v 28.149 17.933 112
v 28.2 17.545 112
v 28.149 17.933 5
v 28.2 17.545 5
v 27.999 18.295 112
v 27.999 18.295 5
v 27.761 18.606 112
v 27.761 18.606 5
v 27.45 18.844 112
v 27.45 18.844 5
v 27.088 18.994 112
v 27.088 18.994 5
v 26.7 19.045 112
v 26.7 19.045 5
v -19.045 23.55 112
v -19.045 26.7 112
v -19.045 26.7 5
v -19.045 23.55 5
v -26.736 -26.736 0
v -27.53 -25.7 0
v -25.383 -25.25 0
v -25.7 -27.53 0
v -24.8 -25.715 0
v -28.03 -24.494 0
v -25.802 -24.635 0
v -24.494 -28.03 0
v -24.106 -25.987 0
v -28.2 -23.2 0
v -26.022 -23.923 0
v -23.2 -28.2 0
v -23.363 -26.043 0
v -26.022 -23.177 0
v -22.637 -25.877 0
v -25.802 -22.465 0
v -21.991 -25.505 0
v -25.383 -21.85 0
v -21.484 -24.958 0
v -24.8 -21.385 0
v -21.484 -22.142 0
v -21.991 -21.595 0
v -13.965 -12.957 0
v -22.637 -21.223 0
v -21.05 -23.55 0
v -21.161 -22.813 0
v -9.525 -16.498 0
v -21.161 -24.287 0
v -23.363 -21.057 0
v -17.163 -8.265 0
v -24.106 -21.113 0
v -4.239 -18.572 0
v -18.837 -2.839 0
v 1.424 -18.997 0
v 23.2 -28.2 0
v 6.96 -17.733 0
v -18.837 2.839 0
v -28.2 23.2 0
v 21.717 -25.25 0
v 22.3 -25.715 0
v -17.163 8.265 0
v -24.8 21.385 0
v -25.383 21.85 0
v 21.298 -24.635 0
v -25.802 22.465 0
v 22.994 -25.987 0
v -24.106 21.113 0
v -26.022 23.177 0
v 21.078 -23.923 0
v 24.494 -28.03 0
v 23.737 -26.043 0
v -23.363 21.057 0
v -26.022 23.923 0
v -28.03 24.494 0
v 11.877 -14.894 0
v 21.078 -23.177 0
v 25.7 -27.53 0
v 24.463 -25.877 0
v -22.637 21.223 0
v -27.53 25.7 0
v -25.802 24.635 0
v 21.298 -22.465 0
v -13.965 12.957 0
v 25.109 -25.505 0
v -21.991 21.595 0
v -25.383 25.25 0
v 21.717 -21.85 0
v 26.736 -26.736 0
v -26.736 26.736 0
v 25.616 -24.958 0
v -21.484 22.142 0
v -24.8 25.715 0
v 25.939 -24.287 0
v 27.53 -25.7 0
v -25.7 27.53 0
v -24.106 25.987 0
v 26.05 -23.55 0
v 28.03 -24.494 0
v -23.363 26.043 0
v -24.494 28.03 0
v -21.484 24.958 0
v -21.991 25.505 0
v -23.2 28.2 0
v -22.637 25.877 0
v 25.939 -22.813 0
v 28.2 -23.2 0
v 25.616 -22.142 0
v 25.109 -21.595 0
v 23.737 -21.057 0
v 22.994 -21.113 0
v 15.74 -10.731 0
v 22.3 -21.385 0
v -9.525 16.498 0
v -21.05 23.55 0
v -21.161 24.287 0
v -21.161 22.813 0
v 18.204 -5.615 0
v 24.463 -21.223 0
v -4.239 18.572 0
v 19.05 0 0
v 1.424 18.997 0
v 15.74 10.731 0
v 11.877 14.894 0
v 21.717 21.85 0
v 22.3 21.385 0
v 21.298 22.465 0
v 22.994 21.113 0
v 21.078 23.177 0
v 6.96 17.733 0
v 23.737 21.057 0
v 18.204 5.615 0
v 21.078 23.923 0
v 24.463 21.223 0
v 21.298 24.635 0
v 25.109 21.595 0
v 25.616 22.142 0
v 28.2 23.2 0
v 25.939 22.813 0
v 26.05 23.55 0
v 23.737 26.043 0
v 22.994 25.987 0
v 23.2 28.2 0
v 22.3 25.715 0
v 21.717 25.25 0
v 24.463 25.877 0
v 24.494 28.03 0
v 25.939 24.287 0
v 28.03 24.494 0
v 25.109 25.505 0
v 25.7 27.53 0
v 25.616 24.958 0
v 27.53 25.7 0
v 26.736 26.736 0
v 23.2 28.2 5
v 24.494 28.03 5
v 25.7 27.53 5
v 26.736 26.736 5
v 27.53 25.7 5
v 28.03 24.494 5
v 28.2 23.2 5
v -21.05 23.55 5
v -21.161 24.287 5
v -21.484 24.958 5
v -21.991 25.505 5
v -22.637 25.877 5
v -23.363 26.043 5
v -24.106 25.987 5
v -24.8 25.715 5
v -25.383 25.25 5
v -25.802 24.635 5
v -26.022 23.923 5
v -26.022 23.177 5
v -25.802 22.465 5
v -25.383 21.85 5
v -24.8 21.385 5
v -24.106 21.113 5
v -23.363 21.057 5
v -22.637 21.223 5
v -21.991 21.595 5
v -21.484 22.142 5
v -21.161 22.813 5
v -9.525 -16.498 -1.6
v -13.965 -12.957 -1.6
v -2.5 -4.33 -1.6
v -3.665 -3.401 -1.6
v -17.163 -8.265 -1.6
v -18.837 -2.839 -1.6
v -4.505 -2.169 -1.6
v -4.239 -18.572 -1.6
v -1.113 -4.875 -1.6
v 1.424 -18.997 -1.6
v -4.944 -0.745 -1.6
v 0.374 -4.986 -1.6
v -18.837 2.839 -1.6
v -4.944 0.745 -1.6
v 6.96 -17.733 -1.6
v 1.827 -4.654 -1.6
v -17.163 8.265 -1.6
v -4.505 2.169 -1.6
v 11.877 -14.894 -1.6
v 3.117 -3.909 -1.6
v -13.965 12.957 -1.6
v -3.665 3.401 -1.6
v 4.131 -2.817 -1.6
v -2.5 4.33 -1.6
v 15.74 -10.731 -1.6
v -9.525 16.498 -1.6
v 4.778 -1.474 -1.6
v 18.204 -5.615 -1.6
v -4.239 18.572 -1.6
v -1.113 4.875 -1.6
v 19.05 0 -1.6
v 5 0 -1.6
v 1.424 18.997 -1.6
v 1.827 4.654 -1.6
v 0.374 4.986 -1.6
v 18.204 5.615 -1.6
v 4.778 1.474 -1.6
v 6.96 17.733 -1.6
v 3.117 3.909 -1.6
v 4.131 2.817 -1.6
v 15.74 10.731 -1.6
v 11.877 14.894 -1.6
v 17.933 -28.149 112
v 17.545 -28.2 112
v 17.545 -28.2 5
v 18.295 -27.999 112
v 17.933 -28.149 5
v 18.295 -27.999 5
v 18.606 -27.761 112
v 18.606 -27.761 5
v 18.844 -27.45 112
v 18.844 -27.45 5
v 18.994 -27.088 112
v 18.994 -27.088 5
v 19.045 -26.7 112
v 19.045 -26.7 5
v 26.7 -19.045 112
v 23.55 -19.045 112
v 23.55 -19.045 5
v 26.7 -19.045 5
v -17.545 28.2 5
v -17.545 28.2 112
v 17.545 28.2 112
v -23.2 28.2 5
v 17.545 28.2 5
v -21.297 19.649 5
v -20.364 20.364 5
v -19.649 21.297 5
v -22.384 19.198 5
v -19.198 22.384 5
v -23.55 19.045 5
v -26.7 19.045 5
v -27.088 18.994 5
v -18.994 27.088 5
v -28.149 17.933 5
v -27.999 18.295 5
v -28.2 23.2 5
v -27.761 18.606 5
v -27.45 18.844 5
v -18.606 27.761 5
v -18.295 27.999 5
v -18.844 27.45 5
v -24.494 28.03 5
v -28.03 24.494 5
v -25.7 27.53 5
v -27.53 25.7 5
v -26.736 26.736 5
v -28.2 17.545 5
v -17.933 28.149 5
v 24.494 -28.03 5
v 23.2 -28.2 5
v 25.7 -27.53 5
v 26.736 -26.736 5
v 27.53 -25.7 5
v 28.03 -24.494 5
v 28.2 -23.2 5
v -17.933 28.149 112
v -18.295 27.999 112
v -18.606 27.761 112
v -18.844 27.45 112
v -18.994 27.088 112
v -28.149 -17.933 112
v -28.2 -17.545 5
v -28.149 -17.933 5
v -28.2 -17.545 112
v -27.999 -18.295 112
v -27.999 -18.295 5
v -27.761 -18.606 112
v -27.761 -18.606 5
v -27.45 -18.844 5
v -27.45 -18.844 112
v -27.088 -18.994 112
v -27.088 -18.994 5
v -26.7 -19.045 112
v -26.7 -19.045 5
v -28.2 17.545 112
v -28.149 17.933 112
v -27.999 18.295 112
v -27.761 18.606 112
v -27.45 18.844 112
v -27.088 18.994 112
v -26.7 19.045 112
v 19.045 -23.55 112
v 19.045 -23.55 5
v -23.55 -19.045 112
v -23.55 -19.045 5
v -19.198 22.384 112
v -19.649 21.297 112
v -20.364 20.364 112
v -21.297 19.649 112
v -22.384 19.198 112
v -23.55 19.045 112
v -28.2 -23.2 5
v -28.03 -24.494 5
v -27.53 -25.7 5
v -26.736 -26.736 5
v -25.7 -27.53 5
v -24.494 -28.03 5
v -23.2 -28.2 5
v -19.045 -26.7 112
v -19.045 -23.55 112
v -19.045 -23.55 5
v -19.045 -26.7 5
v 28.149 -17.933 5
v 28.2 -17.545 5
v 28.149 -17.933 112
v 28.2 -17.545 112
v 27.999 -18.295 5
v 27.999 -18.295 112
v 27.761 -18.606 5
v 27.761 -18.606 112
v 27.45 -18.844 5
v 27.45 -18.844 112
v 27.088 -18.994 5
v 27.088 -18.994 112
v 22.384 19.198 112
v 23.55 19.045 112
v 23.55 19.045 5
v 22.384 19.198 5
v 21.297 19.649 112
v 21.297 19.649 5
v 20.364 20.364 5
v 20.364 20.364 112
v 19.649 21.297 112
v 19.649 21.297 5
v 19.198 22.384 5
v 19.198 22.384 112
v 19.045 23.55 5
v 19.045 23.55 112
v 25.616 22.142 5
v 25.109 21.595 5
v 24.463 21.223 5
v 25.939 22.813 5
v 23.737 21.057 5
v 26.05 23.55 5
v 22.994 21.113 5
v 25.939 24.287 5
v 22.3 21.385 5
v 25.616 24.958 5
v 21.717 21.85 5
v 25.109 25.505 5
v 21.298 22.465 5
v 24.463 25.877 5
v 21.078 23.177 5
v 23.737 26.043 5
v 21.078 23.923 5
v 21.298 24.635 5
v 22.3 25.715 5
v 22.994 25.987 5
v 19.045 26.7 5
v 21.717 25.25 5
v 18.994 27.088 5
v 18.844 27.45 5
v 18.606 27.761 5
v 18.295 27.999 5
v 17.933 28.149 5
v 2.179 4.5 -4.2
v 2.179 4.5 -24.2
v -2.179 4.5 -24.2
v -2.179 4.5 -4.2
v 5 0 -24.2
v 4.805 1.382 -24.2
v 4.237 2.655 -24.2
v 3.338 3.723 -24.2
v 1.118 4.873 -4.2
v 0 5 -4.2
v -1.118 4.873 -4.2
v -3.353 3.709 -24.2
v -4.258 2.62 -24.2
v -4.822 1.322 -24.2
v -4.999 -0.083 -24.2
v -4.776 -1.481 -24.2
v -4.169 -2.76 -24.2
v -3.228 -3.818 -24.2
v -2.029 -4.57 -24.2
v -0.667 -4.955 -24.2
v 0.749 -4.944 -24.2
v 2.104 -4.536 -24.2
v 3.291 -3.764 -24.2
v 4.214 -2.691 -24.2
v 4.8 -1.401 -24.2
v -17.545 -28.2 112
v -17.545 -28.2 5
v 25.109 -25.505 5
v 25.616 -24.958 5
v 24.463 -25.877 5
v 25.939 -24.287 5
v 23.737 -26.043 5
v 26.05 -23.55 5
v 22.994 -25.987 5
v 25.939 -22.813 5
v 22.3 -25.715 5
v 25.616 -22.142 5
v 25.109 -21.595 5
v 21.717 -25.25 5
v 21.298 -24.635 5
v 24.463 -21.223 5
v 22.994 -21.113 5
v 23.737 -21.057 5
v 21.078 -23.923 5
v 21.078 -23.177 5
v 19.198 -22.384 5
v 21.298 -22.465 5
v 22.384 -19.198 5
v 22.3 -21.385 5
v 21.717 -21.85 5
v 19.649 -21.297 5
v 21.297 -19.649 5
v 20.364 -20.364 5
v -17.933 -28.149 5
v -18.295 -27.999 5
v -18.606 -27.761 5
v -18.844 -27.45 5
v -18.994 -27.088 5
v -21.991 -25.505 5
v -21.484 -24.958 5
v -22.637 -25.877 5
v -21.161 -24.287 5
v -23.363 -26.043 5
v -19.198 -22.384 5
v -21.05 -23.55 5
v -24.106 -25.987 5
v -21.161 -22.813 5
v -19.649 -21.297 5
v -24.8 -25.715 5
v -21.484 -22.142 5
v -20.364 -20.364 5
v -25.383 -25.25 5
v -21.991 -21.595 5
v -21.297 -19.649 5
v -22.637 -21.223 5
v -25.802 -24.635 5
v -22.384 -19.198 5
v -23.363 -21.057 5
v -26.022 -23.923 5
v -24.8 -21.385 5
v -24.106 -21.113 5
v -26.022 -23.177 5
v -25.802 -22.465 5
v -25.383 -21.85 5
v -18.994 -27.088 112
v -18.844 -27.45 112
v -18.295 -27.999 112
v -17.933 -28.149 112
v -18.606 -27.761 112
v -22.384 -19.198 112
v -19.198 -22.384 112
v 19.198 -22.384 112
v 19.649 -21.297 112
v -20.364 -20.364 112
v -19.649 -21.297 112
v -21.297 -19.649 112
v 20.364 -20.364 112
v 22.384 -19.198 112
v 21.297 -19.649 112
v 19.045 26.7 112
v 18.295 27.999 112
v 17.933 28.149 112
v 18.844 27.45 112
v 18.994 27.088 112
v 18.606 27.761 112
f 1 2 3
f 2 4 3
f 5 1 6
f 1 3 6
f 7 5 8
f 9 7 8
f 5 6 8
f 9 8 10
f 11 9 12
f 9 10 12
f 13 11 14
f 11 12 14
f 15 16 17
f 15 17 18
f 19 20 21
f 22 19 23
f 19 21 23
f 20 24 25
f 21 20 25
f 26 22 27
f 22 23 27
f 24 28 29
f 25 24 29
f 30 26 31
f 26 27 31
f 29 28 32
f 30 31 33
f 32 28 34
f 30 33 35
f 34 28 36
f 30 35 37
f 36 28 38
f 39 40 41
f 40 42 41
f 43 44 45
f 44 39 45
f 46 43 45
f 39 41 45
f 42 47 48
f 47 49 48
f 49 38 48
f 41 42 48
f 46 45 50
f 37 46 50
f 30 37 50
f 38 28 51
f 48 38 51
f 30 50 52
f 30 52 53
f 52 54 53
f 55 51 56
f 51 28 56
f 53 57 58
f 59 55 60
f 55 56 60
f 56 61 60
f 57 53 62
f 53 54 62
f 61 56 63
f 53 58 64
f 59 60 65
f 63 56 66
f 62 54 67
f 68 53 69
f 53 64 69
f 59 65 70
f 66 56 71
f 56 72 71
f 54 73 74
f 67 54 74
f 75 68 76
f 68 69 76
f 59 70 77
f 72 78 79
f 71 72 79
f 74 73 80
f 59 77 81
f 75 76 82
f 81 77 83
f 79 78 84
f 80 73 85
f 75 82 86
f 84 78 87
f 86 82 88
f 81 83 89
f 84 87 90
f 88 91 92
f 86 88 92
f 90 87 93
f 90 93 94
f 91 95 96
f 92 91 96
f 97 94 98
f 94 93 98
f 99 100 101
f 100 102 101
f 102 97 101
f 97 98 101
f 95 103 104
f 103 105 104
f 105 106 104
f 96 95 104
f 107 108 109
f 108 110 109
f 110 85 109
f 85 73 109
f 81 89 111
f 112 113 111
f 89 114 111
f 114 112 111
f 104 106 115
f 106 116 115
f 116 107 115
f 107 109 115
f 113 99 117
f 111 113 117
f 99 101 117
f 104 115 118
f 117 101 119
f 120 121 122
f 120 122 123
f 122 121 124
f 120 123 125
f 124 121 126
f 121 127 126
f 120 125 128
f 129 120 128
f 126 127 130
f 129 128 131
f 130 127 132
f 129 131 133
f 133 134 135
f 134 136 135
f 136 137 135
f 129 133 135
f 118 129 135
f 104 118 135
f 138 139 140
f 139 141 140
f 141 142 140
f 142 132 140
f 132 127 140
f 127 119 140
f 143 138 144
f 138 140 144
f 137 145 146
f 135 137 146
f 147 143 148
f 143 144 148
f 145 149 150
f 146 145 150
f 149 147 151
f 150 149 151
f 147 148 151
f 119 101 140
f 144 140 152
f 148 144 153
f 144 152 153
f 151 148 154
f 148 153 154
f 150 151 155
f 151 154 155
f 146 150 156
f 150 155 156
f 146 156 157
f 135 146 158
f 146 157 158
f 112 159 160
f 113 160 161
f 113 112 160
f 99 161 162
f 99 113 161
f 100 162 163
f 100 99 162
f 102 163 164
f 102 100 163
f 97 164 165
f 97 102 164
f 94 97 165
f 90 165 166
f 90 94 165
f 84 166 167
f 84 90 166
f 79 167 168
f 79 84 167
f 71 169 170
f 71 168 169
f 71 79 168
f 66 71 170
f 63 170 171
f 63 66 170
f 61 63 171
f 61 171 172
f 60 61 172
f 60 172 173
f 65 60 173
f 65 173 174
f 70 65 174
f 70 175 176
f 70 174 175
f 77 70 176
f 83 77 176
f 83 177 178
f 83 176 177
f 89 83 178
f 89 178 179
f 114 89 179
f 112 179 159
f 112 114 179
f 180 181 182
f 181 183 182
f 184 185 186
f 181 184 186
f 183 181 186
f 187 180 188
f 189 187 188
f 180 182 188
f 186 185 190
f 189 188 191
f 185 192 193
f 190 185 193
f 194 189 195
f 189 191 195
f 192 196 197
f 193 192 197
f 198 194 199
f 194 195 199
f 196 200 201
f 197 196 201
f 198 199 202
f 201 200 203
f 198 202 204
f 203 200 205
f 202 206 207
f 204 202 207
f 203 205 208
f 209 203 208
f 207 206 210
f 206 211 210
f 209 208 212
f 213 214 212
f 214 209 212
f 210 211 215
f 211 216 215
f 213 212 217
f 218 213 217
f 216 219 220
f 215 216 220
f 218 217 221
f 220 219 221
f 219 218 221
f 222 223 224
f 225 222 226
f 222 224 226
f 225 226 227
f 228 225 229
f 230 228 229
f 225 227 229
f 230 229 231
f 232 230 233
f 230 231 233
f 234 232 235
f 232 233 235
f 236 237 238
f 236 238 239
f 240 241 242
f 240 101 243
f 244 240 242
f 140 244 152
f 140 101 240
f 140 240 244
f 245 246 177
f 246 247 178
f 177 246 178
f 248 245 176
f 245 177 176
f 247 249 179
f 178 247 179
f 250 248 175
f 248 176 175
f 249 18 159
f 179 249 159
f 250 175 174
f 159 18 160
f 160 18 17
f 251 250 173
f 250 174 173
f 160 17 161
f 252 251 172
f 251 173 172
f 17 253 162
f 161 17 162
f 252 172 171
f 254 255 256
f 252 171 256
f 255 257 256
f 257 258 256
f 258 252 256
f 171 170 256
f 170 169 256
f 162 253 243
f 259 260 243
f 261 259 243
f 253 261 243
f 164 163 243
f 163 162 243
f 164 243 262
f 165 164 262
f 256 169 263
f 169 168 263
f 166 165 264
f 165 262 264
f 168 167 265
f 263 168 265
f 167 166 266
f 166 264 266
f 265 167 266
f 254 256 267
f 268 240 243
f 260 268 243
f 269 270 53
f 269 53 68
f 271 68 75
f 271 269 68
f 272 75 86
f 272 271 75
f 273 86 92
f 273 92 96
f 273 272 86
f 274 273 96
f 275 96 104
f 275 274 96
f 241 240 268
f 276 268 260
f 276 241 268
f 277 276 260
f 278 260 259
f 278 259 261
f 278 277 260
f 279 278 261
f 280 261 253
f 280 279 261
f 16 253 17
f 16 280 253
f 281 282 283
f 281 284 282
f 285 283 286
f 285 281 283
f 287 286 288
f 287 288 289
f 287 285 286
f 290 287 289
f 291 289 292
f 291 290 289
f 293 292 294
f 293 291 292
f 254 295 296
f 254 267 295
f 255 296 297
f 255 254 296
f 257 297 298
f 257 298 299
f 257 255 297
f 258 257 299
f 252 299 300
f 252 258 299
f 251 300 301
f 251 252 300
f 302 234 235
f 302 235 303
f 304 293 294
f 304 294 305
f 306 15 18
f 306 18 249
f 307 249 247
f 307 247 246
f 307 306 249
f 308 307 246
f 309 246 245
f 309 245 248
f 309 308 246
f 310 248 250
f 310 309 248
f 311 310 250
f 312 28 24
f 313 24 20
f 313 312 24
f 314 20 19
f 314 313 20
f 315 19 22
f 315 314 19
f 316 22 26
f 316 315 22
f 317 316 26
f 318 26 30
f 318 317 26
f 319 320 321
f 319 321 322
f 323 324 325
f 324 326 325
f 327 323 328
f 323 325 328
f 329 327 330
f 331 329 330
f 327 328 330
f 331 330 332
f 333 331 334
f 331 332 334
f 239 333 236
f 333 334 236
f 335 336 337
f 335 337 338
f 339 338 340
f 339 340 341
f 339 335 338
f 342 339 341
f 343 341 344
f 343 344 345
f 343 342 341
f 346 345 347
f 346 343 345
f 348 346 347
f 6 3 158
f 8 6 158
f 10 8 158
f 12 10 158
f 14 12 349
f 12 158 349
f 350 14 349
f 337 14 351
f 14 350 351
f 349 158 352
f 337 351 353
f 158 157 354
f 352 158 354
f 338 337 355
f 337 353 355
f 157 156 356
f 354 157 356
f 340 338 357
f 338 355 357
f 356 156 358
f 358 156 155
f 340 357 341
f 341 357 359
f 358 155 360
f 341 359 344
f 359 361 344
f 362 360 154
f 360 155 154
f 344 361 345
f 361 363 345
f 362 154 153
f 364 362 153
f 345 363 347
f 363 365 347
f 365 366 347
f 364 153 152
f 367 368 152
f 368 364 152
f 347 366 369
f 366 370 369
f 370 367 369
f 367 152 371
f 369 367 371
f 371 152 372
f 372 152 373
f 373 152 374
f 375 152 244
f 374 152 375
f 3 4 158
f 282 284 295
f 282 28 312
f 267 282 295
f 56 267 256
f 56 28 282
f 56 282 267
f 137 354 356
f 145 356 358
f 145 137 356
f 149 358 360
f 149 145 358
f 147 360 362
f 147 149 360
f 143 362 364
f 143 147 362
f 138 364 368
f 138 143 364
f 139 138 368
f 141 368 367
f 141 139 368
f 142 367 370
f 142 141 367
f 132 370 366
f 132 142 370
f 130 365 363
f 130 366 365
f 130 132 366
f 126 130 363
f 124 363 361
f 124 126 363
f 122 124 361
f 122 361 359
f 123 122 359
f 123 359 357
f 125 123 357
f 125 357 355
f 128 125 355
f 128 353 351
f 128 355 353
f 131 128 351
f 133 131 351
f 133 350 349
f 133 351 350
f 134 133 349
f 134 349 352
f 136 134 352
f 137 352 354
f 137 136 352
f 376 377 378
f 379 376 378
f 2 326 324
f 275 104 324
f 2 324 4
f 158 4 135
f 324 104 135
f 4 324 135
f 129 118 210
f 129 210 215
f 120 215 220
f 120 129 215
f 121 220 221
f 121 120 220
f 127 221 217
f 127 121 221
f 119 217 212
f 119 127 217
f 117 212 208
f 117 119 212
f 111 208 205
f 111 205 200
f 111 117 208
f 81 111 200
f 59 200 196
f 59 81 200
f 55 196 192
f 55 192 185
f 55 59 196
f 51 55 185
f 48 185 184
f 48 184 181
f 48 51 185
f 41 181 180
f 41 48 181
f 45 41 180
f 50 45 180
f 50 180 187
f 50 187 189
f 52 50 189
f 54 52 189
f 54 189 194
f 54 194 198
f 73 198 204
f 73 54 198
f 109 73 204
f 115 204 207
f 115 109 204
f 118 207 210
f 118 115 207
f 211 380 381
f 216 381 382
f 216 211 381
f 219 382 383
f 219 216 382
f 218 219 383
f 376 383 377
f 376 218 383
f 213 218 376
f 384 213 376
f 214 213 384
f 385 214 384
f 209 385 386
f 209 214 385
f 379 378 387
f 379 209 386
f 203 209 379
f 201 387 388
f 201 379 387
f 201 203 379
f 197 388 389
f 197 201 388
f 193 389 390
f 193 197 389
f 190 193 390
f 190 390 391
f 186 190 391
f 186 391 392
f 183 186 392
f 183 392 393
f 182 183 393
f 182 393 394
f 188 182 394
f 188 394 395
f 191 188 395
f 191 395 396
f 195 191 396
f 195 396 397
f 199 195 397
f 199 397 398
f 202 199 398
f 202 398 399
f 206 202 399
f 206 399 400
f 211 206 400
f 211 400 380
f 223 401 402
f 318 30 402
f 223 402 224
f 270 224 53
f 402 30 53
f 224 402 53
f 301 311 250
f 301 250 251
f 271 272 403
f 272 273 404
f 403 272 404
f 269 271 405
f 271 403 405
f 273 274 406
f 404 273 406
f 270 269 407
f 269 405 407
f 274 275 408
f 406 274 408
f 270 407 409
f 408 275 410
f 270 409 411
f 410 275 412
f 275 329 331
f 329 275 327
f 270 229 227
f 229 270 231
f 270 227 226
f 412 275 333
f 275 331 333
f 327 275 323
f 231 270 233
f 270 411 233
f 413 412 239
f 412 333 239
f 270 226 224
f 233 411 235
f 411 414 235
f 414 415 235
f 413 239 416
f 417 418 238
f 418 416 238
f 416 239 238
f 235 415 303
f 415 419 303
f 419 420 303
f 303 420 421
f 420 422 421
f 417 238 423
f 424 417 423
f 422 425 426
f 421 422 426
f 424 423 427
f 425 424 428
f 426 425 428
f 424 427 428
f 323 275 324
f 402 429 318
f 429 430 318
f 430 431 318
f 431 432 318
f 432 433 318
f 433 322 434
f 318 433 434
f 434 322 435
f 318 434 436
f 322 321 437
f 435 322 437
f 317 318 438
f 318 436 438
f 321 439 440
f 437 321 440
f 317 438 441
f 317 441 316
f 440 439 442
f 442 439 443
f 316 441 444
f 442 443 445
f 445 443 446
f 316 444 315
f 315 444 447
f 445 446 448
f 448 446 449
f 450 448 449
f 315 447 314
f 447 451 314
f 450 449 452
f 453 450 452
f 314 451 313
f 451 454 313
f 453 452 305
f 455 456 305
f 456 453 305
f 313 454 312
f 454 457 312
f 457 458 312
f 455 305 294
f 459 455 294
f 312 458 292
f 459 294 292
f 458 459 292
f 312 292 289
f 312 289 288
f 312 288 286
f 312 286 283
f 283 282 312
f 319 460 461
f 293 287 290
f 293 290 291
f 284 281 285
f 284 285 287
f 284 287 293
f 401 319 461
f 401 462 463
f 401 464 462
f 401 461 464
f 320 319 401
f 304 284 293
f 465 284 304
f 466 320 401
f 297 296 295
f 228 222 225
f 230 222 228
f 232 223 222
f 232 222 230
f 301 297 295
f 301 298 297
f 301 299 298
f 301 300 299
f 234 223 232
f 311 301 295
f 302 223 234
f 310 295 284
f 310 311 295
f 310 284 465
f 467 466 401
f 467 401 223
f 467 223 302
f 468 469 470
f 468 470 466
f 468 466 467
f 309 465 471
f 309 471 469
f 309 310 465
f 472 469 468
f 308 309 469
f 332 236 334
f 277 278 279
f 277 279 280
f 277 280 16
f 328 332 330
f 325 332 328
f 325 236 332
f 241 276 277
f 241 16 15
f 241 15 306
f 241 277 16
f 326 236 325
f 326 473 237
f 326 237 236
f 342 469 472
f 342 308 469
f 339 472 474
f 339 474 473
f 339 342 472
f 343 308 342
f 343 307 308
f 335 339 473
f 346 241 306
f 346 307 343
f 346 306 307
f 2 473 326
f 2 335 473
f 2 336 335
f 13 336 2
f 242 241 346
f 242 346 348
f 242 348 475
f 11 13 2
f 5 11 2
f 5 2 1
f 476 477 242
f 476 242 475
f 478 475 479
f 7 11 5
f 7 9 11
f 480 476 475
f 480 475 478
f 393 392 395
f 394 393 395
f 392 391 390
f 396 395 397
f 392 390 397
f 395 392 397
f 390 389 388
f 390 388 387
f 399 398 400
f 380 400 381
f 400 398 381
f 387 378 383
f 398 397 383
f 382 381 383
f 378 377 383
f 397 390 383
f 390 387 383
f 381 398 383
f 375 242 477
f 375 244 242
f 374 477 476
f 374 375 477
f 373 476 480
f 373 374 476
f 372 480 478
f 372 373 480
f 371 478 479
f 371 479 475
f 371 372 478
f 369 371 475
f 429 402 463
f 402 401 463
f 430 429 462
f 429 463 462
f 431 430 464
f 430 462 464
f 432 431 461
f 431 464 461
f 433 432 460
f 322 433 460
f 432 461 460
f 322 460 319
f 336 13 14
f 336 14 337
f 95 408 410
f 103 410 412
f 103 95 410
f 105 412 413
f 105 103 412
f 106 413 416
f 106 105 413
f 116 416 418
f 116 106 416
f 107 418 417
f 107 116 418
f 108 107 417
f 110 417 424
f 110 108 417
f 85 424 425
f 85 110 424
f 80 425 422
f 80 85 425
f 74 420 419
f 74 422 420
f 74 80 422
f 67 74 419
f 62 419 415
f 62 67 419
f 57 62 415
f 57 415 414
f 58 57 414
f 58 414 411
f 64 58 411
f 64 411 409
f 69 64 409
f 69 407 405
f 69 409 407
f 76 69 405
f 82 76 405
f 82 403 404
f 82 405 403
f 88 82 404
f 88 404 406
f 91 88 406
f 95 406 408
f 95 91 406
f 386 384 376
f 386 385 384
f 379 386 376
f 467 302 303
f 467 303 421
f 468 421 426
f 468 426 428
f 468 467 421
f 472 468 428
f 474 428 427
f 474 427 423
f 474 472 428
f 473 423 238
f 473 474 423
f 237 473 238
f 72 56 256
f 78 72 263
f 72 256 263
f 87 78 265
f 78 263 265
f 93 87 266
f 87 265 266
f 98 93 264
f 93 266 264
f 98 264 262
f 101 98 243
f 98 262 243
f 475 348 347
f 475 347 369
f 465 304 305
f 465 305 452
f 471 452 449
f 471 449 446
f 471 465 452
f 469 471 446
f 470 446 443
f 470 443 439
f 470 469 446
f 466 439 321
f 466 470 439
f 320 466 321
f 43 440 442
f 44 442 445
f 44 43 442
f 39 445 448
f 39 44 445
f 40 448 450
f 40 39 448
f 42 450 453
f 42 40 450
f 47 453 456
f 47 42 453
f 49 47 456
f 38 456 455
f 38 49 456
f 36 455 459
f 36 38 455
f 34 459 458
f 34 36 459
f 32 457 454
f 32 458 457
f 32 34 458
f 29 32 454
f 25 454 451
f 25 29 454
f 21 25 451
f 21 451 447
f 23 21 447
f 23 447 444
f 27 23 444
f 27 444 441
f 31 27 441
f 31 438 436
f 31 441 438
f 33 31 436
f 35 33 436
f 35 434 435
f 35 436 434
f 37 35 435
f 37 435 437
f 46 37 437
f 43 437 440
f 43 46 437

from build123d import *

# Parameters (mm, degrees)
SKETCH1_W           = 56.4
SKETCH1_H           = 56.4
SKETCH1_R           = 2.5
BOSS_EXTRUDE1_DEPTH = 112
SKETCH1_3_R         = 19.05
BOSS_EXTRUDE2_DEPTH = 1.6
FILLET1_R           = 5
CUT_EXTRUDE1_DEPTH  = 107
FILLET2_R           = 1.5
SKETCH1_4_R         = 5
BOSS_EXTRUDE3_DEPTH = 24.2
SKETCH3_W           = 4.358898944
SKETCH3_H           = 0.854235542
CUT_EXTRUDE2_DEPTH  = 20


with BuildPart() as part:
    # Sketch1 → Boss-Extrude1 (new body)
    with BuildSketch(Plane.XY):
        Rectangle(SKETCH1_W, SKETCH1_H)
        with Locations((-23.55, -23.55)):
            Circle(SKETCH1_R, mode=Mode.SUBTRACT)
        with Locations((23.55, -23.55)):
            Circle(SKETCH1_R, mode=Mode.SUBTRACT)
        with Locations((-23.55, 23.55)):
            Circle(SKETCH1_R, mode=Mode.SUBTRACT)
        with Locations((23.55, 23.55)):
            Circle(SKETCH1_R, mode=Mode.SUBTRACT)
    extrude(amount=BOSS_EXTRUDE1_DEPTH)

    # Sketch1<3> → Boss-Extrude2 (add)
    with BuildSketch(Plane.XY):
        Circle(SKETCH1_3_R)
    extrude(amount=-BOSS_EXTRUDE2_DEPTH)

    # Fillet1
    fillet1_edges = [part.edges().sort_by_distance(p)[0] for p in [
        (-28.2, 28.2, 56),
        (-28.2, -28.2, 56),
        (28.2, -28.2, 56),
        (28.2, 28.2, 56),
    ]]
    fillet(fillet1_edges, radius=FILLET1_R)

    # Sketch2 → Cut-Extrude1 (cut)
    with BuildSketch(Plane.XY.offset(112)):
        with BuildLine():
            Line((-23.55, 19.044974747), (-31.616752069, 19.044974747))
            Line((-31.616752069, 19.044974747), (-31.616752069, 32.365774456))
            Line((-31.616752069, 32.365774456), (-19.044974747, 32.365774456))
            Line((-19.044974747, 32.365774456), (-19.044974747, 23.55))
            ThreePointArc((-19.044974747, 23.55), (-20.364466094, 20.364466094), (-23.55, 19.044974747))
        make_face()
        with BuildLine():
            Line((19.044974747, 23.55), (19.044974747, 31.616752069))
            Line((19.044974747, 31.616752069), (32.365774456, 31.616752069))
            Line((32.365774456, 31.616752069), (32.365774456, 19.044974747))
            Line((32.365774456, 19.044974747), (23.55, 19.044974747))
            ThreePointArc((23.55, 19.044974747), (20.364466094, 20.364466094), (19.044974747, 23.55))
        make_face()
        with BuildLine():
            Line((23.55, -19.044974747), (31.616752069, -19.044974747))
            Line((31.616752069, -19.044974747), (31.616752069, -32.365774456))
            Line((31.616752069, -32.365774456), (19.044974747, -32.365774456))
            Line((19.044974747, -32.365774456), (19.044974747, -23.55))
            ThreePointArc((19.044974747, -23.55), (20.364466094, -20.364466094), (23.55, -19.044974747))
        make_face()
        with BuildLine():
            Line((-19.044974747, -23.55), (-19.044974747, -31.616752069))
            Line((-19.044974747, -31.616752069), (-32.365774456, -31.616752069))
            Line((-32.365774456, -31.616752069), (-32.365774456, -19.044974747))
            Line((-32.365774456, -19.044974747), (-23.55, -19.044974747))
            ThreePointArc((-23.55, -19.044974747), (-20.364466094, -20.364466094), (-19.044974747, -23.55))
        make_face()
    extrude(amount=-CUT_EXTRUDE1_DEPTH, mode=Mode.SUBTRACT)

    # Fillet2
    fillet2_edges = [part.edges().sort_by_distance(p)[0] for p in [
        (-28.2, -19.044974747, 58.5),
        (-19.044974747, -28.2, 58.5),
        (19.044974747, -28.2, 58.5),
        (28.2, -19.044974747, 58.5),
        (28.2, 19.044974747, 58.5),
        (19.044974747, 28.2, 58.5),
        (-19.044974747, 28.2, 58.5),
        (-28.2, 19.044974747, 58.5),
    ]]
    fillet(fillet2_edges, radius=FILLET2_R)

    # Sketch1<4> → Boss-Extrude3 (add)
    with BuildSketch(Plane.XY):
        Circle(SKETCH1_4_R)
    extrude(amount=-BOSS_EXTRUDE3_DEPTH)

    # Sketch3 → Cut-Extrude2 (cut)
    with BuildSketch(Plane(origin=(0, 0, -24.2), x_dir=(-1, 0, 0), z_dir=(0, 0, -1))):
        with Locations((0, 4.927117771)):
            Rectangle(SKETCH3_W, SKETCH3_H)
    extrude(amount=-CUT_EXTRUDE2_DEPTH, mode=Mode.SUBTRACT)


solid = part.part
